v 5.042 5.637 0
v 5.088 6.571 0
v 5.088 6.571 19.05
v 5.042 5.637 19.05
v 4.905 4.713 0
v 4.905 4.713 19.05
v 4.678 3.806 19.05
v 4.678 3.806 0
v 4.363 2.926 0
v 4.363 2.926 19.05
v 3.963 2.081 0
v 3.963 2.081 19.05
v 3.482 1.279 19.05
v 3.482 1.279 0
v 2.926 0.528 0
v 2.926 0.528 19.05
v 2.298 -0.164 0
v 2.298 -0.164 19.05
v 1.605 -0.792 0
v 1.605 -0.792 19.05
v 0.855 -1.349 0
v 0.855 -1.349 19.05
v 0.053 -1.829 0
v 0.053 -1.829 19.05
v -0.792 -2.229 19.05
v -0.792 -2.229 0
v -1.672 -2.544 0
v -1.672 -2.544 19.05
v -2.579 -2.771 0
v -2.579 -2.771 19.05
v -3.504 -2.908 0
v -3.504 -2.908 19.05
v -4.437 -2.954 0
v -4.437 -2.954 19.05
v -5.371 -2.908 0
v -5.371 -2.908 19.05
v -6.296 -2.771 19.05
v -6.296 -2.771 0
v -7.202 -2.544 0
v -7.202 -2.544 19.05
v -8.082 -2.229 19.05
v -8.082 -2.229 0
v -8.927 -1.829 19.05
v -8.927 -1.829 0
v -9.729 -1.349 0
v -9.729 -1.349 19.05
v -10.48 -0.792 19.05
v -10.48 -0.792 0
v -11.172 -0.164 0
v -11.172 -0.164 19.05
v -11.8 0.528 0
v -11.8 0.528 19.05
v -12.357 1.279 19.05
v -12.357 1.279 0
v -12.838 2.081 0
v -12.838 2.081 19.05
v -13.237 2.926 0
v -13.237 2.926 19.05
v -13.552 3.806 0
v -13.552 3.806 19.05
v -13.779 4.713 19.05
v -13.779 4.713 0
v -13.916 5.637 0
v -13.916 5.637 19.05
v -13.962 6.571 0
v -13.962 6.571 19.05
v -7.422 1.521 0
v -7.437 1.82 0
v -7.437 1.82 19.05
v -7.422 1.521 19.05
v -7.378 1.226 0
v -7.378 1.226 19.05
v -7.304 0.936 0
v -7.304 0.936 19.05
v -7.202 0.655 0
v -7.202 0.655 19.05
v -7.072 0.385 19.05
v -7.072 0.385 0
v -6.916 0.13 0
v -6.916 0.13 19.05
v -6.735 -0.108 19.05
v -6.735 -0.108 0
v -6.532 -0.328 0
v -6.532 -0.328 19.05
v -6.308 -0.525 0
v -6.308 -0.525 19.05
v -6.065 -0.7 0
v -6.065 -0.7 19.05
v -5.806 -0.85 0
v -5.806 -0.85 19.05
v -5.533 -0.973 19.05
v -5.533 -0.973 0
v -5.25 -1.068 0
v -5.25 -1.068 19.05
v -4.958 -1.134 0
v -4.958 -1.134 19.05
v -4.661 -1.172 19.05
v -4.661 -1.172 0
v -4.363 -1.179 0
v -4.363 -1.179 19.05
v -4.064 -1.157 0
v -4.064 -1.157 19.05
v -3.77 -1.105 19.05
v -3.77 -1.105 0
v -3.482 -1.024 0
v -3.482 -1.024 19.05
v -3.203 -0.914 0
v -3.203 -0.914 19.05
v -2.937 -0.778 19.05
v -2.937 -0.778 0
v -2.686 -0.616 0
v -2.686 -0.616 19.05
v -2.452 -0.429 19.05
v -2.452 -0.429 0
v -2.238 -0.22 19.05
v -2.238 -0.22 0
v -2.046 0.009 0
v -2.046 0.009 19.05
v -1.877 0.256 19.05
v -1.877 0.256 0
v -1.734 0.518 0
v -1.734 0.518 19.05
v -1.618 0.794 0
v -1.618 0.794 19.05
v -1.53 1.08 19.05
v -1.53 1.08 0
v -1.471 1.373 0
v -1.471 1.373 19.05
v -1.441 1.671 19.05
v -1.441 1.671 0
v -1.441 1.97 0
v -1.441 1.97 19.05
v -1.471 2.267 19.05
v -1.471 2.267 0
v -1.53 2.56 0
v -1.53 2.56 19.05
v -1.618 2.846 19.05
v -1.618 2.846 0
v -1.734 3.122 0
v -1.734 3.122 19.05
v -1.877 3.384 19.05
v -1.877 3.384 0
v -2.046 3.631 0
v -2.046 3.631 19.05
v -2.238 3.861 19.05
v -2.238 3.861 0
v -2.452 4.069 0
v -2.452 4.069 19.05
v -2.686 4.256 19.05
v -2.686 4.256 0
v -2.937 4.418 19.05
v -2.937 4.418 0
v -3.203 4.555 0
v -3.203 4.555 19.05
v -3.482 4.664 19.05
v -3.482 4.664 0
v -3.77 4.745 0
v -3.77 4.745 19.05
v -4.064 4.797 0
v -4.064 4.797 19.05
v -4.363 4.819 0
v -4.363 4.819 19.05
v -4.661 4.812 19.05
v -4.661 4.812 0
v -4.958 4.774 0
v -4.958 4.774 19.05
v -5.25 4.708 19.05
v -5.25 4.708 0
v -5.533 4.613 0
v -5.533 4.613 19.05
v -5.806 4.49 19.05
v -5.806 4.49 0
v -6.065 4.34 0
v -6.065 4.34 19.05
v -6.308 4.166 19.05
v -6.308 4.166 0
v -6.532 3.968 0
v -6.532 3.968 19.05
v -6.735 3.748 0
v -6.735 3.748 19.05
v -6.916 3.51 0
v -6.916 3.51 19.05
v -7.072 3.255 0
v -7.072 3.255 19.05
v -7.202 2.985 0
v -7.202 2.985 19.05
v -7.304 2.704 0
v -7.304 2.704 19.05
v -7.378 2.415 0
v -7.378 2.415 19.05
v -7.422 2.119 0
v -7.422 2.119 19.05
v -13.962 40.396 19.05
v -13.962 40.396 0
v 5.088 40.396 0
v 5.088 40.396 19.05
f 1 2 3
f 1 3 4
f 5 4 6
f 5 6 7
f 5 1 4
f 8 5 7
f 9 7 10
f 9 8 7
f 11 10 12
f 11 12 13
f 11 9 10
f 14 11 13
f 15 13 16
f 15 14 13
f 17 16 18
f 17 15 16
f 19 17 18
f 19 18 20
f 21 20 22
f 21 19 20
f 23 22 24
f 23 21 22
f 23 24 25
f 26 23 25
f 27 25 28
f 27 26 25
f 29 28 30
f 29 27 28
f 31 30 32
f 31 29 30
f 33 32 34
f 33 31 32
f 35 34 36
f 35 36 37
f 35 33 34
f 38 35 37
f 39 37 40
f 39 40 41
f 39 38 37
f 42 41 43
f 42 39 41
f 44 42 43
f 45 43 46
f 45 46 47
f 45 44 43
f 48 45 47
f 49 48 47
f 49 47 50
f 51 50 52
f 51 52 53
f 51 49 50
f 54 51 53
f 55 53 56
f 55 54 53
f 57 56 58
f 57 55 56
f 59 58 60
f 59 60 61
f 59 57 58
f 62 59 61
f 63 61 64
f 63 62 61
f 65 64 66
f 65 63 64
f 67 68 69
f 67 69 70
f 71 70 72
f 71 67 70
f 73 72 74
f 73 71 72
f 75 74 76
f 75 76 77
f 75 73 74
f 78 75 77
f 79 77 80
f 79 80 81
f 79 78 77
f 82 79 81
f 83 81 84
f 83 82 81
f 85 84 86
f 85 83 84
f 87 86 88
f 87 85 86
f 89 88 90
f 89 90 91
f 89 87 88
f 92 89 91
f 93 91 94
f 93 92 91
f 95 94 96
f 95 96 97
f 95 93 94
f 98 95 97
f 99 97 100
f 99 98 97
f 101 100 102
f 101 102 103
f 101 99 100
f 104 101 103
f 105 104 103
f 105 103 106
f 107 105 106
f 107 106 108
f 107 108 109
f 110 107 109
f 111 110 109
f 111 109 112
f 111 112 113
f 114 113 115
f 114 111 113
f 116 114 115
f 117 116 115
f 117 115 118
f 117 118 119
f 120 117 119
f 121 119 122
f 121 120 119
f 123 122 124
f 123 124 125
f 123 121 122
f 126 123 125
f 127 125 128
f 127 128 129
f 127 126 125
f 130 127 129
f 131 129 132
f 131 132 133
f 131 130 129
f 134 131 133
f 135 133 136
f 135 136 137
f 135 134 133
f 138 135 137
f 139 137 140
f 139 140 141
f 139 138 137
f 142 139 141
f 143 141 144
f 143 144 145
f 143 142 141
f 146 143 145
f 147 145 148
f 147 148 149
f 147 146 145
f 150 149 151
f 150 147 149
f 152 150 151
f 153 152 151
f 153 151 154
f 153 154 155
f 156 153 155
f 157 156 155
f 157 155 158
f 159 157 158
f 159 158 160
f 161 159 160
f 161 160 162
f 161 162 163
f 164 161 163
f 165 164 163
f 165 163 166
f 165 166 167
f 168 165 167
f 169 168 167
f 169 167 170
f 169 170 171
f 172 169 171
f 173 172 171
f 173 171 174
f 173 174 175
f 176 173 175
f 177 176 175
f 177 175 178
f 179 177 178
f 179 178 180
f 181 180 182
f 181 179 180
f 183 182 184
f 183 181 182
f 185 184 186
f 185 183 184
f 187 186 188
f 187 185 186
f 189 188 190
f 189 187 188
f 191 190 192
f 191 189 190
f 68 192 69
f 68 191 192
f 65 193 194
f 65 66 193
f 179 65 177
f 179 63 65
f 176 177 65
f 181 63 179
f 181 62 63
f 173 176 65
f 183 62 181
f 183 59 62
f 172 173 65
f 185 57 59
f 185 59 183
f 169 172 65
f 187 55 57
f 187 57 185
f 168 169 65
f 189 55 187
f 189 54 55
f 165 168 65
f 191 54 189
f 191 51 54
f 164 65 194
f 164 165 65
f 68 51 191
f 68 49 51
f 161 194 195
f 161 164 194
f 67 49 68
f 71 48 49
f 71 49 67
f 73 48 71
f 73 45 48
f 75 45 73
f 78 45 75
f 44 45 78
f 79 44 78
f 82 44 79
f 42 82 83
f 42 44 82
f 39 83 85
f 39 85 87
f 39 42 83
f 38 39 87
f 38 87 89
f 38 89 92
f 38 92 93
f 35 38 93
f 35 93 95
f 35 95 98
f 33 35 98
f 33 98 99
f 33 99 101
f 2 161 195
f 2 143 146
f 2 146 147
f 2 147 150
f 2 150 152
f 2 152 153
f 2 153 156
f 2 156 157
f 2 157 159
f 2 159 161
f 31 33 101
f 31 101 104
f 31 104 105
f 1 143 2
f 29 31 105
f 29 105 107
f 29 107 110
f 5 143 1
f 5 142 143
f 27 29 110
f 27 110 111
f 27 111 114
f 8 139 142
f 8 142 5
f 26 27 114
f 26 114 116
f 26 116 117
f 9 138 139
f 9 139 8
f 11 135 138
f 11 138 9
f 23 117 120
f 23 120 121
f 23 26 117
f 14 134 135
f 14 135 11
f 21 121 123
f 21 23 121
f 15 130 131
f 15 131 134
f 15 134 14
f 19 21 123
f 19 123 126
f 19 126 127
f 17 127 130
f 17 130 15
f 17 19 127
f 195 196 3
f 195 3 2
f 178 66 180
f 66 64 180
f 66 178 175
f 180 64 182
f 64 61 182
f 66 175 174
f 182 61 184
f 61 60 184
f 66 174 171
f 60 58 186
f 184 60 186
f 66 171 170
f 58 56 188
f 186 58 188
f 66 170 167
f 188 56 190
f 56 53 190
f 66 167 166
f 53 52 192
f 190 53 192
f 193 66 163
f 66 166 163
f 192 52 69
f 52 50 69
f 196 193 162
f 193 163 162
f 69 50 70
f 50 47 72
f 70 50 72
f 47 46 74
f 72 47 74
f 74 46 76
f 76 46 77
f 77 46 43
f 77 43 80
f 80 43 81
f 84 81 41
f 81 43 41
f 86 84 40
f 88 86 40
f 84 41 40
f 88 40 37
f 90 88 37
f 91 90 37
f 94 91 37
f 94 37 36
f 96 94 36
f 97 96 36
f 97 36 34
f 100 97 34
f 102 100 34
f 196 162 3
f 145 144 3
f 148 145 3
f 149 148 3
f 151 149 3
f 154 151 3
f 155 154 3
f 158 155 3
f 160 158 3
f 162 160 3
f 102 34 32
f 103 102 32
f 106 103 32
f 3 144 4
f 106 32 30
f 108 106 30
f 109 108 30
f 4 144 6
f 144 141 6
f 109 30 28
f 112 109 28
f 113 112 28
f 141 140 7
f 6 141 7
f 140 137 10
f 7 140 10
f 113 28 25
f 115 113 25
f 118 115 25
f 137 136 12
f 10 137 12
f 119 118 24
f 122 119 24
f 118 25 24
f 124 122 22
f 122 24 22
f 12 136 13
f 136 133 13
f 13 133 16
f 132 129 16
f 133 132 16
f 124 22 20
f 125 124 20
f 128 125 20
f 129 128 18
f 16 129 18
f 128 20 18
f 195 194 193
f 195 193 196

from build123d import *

# Parameters (mm, degrees)
SKETCH1_R           = 3
BOSS_EXTRUDE1_DEPTH = 19.05
SKETCH3_W           = 19.05
SKETCH3_H           = 19.05
BOSS_EXTRUDE2_DEPTH = 25.4


with BuildPart() as part:
    # Sketch1 → Boss-Extrude1 (new body)
    with BuildSketch(Plane.XY):
        with BuildLine():
            Line((-13.962302658, 14.995513055), (5.087697342, 14.995513055))
            Line((5.087697342, 14.995513055), (5.087697342, 6.570840919))
            ThreePointArc((5.087697342, 6.570840919), (-4.437302658, -2.954159081), (-13.962302658, 6.570840919))
            Line((-13.962302658, 6.570840919), (-13.962302658, 14.995513055))
        make_face()
        with Locations(Location((-4.437302658, 1.820065848, 0), (0, 0, 180))):
            Circle(SKETCH1_R, mode=Mode.SUBTRACT)
    extrude(amount=BOSS_EXTRUDE1_DEPTH)

    # Sketch3 → Boss-Extrude2 (add)
    with BuildSketch(Plane(origin=(0, 14.995513055, 0), x_dir=(1, 0, 0), z_dir=(0, 1, 0))):
        with Locations((-4.437302658, -9.525)):
            Rectangle(SKETCH3_W, SKETCH3_H)
    extrude(amount=BOSS_EXTRUDE2_DEPTH)


solid = part.part
